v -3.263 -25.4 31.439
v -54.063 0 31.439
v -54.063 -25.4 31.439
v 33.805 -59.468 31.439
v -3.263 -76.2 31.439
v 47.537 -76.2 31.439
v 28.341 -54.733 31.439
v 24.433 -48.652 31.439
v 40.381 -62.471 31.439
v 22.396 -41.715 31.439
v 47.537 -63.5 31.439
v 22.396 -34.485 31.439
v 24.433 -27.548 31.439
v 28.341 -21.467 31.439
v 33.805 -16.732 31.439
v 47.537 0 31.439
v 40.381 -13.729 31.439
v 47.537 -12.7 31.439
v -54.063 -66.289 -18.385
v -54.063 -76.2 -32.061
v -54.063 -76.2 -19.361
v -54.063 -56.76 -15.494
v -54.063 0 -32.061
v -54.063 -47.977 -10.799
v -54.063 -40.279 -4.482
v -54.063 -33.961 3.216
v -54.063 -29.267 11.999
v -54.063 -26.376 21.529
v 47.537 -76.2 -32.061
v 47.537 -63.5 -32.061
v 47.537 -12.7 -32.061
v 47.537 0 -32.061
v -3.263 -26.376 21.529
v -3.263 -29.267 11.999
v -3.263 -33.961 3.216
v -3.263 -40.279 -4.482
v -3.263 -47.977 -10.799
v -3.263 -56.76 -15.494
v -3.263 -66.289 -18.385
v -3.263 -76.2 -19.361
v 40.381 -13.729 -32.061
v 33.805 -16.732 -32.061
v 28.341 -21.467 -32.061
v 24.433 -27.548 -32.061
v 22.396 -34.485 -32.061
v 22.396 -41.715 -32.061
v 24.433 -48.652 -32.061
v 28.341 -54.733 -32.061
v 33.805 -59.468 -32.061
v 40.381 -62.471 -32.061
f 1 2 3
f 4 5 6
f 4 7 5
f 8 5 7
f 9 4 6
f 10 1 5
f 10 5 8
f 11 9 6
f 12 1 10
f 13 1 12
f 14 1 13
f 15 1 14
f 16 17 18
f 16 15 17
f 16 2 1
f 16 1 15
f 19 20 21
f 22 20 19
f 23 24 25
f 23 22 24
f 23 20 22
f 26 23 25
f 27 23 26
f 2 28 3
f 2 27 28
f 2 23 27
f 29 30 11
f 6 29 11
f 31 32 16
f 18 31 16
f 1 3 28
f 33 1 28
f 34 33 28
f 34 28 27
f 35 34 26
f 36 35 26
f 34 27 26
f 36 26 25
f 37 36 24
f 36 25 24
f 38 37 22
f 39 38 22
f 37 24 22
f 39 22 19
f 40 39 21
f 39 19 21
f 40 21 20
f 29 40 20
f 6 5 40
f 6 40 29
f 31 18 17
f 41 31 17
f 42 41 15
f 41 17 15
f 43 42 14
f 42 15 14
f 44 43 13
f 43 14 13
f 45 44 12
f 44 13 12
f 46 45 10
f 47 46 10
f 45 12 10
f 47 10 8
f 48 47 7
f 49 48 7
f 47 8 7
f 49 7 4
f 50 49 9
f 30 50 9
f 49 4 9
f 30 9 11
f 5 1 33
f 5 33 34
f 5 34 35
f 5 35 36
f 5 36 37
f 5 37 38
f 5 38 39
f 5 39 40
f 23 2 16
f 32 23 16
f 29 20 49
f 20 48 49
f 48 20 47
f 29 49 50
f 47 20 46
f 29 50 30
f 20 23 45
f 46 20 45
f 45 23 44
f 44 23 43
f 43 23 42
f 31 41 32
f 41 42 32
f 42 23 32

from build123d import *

# Parameters (mm, degrees)
F0_W     = 101.6
F0_H     = 63.5
F1_DEPTH = 76.2
F3_DEPTH = 63.5
F5_DEPTH = 50.8


with BuildPart() as f1:
    # F0 (on Front) → F1 (new body)
    with BuildSketch(Plane.XZ):
        with Locations((-3.26282, -0.310746)):
            Rectangle(F0_W, F0_H)
    extrude(amount=F1_DEPTH)

    # F2 (on face) → F3 (cut)
    with BuildSketch(Plane.XY.offset(31.439254)):
        with BuildLine():
            Line((47.53718, -63.5), (47.53718, -12.7))
            ThreePointArc((47.53718, -12.7), (22.13718, -38.1), (47.53718, -63.5))
        make_face()
    extrude(amount=-F3_DEPTH, mode=Mode.SUBTRACT)

    # F4 (on face) → F5 (cut)
    with BuildSketch(Plane(origin=(-54.06282, 0, 0), x_dir=(0, -1, 0), z_dir=(-1, 0, 0))):
        with BuildLine():
            Line((76.2, 31.439254), (25.4, 31.439254))
            ThreePointArc((25.4, 31.439254), (40.278976, -4.481771), (76.2, -19.360746))
            Line((76.2, -19.360746), (76.2, 31.439254))
        make_face()
    extrude(amount=-F5_DEPTH, mode=Mode.SUBTRACT)


solid = f1.part
